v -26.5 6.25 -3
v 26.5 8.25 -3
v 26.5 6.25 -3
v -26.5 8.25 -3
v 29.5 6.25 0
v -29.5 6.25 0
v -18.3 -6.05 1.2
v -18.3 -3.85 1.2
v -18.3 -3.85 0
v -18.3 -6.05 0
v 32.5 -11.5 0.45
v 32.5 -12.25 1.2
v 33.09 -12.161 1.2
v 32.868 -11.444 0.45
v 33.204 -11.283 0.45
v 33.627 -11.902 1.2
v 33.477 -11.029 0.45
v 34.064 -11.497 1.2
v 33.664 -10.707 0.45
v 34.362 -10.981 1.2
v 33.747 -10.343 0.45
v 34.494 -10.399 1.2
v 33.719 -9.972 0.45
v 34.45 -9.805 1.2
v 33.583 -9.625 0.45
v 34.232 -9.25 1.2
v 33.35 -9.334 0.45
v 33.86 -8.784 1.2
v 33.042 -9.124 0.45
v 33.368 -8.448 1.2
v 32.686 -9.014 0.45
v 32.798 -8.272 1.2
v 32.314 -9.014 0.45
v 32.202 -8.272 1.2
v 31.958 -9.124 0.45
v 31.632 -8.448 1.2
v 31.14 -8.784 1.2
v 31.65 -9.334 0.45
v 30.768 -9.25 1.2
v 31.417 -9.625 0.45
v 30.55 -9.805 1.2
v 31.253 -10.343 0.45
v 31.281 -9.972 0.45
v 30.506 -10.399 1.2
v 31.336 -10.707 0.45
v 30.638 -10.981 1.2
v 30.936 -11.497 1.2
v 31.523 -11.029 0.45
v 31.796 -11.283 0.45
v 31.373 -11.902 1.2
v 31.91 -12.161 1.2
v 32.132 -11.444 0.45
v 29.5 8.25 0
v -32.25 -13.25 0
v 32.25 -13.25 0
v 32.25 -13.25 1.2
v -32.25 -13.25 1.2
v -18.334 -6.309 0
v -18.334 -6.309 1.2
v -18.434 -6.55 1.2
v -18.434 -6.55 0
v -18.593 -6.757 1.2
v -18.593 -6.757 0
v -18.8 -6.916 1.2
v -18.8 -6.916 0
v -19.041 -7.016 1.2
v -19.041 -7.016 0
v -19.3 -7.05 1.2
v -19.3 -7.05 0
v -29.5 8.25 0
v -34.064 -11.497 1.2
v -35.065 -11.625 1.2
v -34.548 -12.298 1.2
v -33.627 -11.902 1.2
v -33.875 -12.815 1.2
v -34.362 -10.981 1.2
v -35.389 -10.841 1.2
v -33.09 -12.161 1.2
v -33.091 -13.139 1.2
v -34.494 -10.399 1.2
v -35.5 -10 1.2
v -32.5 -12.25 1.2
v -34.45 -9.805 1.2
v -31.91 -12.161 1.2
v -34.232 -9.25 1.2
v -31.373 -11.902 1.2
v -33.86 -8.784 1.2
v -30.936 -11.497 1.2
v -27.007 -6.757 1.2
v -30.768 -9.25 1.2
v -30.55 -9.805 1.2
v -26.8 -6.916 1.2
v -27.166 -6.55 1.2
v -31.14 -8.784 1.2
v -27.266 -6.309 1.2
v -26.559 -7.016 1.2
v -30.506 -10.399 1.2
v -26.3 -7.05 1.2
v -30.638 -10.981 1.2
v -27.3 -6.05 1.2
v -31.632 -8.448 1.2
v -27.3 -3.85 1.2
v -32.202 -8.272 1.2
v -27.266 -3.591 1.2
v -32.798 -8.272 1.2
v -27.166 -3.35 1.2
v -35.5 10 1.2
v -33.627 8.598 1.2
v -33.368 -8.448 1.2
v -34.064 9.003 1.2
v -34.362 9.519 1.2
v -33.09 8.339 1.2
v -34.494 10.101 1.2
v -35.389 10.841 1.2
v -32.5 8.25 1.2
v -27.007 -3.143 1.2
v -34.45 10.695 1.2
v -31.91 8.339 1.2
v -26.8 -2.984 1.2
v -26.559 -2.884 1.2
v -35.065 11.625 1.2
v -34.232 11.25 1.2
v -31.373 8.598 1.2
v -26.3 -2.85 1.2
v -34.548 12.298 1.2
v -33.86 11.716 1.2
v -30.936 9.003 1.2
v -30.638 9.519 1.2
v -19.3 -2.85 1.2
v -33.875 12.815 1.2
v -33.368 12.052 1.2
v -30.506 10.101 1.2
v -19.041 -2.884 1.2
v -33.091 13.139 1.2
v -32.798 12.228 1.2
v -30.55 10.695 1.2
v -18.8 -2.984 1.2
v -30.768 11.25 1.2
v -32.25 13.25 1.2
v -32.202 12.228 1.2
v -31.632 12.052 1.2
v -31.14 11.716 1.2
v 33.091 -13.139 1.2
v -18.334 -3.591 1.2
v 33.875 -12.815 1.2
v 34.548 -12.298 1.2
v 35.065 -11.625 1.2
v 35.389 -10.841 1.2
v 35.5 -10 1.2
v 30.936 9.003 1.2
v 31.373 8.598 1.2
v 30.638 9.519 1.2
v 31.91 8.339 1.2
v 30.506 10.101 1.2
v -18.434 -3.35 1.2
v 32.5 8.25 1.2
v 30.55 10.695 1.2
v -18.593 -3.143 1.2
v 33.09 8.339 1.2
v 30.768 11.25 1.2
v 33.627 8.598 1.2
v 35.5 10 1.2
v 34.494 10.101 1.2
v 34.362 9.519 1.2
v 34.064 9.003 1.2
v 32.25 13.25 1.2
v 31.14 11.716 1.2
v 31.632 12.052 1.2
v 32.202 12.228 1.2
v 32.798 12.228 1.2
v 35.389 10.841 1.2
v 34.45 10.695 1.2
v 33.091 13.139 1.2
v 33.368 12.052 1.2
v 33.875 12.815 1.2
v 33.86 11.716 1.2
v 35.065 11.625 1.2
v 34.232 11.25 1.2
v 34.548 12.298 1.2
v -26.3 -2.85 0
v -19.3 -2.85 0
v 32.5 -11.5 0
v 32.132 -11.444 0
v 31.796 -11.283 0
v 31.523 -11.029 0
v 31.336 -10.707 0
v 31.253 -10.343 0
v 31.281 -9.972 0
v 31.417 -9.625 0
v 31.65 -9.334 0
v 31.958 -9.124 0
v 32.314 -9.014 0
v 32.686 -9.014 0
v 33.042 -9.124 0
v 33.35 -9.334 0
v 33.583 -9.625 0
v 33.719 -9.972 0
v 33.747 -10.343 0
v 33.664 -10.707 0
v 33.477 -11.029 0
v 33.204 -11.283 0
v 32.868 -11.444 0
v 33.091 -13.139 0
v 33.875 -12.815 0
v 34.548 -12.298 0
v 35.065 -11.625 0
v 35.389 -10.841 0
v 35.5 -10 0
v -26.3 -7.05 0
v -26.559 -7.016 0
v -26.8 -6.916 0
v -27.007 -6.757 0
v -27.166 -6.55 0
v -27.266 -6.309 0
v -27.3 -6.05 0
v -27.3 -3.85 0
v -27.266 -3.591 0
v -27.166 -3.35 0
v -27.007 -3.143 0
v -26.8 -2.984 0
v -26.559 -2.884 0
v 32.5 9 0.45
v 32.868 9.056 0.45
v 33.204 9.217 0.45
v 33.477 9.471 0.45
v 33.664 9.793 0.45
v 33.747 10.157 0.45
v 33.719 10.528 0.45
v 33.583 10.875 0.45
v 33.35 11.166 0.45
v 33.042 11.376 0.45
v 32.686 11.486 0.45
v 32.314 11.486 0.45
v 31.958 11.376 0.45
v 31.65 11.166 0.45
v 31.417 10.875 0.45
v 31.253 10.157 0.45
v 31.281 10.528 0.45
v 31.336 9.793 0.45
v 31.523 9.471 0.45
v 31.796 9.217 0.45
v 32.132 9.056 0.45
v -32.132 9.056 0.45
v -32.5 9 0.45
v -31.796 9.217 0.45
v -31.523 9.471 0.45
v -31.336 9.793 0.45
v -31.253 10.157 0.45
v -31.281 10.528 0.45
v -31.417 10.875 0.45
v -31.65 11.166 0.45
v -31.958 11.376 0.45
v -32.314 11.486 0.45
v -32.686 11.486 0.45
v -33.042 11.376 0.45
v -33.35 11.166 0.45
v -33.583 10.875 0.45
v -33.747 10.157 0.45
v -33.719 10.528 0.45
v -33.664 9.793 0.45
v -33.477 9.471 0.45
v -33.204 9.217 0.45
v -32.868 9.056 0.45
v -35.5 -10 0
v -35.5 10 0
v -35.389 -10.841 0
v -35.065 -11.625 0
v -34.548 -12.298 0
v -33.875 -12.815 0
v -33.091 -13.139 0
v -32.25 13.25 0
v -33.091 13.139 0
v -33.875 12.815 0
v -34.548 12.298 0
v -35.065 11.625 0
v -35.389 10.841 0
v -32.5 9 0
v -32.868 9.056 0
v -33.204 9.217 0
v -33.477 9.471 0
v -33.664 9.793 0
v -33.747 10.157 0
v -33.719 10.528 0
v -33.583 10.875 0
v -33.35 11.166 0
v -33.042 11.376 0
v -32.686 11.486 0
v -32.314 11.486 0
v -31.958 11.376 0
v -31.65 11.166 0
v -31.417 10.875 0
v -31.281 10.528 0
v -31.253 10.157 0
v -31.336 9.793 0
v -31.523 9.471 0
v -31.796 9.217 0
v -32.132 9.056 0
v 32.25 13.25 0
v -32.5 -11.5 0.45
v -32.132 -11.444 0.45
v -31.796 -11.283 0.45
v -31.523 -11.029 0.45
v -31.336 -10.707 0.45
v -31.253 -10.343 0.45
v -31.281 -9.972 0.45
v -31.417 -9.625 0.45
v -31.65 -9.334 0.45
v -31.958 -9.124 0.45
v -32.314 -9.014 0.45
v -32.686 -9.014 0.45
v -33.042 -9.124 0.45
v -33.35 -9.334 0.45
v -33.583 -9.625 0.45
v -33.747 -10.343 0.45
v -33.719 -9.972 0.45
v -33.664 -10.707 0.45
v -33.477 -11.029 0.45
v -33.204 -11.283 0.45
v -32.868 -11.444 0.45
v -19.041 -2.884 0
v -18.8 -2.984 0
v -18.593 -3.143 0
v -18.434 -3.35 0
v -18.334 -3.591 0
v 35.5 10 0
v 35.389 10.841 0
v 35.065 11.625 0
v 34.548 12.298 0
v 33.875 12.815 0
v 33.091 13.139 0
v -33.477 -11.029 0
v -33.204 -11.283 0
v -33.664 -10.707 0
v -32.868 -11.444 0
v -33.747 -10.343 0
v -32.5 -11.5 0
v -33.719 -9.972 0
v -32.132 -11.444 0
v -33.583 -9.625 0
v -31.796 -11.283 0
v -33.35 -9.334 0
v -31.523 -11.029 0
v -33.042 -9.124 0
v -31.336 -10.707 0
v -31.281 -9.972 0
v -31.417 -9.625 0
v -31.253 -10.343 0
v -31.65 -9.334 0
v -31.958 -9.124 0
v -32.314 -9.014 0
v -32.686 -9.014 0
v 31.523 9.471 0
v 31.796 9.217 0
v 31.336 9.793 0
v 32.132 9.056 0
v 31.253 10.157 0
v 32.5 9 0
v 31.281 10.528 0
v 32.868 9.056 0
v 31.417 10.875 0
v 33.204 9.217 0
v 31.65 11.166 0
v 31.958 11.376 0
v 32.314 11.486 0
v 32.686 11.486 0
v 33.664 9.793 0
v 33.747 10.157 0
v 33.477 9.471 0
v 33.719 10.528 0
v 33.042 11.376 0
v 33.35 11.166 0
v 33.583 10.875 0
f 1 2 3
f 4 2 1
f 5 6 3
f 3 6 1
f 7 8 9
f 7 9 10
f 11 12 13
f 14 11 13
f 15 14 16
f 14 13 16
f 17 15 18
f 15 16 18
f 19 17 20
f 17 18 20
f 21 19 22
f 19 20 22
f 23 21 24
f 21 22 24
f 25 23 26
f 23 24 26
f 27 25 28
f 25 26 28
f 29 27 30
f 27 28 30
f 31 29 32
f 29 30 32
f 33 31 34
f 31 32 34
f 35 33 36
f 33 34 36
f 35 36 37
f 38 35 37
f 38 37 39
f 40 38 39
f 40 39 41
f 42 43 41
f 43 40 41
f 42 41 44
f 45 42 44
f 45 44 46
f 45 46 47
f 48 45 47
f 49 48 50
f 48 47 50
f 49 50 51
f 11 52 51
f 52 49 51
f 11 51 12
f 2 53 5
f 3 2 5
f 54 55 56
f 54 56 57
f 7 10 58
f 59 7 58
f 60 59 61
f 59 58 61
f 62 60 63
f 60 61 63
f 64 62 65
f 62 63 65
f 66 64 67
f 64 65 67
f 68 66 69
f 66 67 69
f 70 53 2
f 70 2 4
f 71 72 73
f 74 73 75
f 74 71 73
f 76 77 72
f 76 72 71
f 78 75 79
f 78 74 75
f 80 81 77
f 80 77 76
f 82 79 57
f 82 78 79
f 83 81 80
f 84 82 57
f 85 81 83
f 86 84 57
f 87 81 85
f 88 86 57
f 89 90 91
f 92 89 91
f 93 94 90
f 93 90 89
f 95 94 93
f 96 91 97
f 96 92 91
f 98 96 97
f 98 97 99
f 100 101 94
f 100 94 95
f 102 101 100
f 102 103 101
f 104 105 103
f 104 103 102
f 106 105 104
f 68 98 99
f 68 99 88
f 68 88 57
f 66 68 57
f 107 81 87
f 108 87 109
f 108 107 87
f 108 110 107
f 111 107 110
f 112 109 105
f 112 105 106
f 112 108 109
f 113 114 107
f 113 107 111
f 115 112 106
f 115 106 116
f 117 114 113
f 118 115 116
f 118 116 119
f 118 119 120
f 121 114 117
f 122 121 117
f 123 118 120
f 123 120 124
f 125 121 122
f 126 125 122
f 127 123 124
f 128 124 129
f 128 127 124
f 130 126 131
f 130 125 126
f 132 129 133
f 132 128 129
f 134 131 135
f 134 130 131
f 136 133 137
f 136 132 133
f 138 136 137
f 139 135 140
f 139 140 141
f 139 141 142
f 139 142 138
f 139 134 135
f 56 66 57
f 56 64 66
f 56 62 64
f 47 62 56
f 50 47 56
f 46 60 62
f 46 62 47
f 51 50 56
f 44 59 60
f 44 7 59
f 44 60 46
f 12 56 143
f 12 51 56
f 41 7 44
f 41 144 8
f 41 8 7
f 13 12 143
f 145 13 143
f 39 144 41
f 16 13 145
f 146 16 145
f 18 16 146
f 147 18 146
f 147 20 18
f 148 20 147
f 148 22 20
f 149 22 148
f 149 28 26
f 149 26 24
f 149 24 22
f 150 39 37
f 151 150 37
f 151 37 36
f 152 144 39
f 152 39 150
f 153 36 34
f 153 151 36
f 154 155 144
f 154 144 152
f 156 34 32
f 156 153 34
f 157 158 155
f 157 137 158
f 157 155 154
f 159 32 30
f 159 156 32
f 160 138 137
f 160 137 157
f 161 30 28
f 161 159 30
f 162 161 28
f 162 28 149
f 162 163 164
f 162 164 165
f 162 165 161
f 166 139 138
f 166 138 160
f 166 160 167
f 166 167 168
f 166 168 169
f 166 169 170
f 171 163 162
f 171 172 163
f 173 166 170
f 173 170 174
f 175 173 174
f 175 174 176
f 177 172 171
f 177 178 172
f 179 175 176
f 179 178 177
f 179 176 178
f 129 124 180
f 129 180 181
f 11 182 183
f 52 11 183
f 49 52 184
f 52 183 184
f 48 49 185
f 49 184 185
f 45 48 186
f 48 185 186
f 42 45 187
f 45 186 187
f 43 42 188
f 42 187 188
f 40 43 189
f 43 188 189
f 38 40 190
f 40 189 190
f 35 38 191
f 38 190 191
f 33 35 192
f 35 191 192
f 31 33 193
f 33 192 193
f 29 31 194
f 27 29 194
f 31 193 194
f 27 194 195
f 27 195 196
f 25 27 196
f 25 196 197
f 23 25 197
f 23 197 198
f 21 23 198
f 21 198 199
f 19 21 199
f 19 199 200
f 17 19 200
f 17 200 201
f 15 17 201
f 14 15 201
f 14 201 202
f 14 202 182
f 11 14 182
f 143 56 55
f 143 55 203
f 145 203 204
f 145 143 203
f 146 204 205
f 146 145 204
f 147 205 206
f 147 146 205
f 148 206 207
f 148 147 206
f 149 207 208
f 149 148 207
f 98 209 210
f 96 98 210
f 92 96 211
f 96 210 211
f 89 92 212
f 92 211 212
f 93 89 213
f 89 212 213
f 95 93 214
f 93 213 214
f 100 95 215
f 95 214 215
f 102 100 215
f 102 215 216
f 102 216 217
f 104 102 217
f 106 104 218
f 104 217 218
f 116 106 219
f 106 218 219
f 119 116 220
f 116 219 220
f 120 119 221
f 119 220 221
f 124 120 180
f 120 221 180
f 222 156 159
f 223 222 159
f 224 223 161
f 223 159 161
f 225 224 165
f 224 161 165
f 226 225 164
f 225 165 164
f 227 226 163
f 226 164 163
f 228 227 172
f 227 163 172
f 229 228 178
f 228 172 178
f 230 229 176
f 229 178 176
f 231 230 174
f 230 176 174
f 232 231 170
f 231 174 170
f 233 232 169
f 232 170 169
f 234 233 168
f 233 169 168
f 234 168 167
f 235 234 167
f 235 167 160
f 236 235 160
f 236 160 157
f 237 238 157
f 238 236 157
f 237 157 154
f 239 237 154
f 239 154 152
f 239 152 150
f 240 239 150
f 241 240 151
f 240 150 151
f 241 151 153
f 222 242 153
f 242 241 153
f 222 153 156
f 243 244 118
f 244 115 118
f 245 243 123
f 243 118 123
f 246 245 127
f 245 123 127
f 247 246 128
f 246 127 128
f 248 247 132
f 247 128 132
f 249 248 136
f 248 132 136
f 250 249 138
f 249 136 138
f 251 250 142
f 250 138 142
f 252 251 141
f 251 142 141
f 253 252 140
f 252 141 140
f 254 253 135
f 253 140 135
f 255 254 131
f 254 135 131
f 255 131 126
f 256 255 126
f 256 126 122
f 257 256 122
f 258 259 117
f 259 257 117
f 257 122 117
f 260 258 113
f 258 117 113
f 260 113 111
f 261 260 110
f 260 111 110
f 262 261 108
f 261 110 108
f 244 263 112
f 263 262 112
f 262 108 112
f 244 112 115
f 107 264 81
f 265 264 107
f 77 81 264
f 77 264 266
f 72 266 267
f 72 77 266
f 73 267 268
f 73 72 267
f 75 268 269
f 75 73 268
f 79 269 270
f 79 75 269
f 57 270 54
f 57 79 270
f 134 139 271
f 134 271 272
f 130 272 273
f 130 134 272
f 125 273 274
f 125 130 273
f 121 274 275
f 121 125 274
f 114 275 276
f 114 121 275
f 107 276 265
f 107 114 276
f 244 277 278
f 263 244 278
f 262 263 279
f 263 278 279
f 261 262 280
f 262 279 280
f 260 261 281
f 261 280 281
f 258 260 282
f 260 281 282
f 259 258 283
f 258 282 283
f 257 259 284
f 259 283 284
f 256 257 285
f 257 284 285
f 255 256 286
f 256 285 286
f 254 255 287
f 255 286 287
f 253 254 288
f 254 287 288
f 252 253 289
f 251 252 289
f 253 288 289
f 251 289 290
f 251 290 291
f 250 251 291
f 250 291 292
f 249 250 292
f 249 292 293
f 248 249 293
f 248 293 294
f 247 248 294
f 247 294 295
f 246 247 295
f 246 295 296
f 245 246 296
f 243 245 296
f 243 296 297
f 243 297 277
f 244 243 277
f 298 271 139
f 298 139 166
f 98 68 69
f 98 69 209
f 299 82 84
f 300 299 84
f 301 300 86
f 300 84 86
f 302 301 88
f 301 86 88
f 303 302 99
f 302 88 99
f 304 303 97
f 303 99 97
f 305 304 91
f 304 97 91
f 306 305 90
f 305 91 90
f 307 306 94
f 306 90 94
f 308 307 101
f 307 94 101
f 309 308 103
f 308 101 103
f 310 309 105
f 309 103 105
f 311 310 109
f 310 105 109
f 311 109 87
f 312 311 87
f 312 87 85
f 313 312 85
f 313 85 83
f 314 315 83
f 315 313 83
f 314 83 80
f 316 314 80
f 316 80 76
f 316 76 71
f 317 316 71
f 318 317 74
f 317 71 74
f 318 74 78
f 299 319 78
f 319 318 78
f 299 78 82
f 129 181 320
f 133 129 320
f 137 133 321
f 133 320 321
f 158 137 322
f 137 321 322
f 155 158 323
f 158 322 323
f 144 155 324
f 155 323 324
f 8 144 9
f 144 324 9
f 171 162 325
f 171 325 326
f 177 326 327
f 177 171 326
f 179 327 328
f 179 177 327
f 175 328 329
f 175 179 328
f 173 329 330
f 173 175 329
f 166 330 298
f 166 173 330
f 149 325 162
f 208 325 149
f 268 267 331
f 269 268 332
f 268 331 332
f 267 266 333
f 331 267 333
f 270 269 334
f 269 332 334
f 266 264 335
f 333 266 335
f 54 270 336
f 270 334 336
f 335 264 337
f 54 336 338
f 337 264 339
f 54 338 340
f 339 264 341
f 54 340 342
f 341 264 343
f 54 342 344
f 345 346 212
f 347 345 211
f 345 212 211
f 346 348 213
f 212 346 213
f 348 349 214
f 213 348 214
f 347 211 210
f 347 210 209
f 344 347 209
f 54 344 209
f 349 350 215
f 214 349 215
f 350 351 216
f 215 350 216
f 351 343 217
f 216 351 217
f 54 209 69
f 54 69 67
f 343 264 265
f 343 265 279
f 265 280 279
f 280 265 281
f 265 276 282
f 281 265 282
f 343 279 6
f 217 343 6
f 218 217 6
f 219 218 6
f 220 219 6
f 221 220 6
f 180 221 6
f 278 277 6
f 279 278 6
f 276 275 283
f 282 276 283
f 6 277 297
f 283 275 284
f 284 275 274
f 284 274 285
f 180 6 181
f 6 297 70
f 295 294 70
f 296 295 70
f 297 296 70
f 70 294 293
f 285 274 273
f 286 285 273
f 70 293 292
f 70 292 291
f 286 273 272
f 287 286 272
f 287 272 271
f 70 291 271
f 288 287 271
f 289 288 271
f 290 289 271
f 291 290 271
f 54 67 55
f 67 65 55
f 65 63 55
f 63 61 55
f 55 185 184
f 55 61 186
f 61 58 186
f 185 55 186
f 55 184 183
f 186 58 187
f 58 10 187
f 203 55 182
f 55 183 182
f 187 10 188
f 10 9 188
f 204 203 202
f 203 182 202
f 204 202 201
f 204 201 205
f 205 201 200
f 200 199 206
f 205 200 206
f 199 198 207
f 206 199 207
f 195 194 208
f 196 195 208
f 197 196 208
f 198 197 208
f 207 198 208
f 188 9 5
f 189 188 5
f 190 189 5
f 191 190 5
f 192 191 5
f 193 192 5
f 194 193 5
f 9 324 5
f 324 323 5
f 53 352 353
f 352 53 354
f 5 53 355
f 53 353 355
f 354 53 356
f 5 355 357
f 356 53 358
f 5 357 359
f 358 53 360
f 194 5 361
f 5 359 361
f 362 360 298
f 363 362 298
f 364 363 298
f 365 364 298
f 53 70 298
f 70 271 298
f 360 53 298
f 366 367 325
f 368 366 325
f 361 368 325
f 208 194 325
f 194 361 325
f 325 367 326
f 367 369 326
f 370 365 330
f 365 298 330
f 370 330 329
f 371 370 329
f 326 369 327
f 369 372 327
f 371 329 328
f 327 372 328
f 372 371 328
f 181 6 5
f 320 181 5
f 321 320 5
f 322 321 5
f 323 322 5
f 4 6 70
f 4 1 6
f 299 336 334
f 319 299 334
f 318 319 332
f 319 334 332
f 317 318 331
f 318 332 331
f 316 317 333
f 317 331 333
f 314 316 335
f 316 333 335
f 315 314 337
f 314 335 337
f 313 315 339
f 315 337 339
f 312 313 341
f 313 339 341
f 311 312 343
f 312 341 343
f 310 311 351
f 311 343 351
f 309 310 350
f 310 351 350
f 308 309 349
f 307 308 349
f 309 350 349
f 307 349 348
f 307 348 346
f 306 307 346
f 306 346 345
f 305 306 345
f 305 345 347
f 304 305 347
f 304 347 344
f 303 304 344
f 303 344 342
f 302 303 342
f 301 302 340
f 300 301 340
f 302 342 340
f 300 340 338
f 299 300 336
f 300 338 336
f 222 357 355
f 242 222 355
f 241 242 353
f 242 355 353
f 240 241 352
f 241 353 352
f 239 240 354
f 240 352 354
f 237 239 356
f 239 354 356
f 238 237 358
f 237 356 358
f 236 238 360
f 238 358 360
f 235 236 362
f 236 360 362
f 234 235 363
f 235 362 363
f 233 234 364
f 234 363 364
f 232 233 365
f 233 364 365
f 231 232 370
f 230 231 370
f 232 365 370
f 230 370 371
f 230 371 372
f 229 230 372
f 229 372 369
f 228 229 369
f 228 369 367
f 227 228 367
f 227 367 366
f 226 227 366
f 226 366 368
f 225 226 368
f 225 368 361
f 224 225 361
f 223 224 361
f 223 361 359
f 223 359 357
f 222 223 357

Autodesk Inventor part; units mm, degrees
ref_plane "YZ Plane" through (0, 0, 0) normal (1, 0, 0) x (0, 1, 0)
ref_plane "XZ Plane" through (0, 0, 0) normal (0, 1, 0) x (-1, 0, 0)
ref_plane "XY Plane" through (0, 0, 0) normal (0, 0, 1) x (1, 0, 0)
sketch "Sketch1" plane through (0, 0, 0) normal (0, 0, 1) x (1, 0, 0)
  line L0 (-35.5, 13.25) -> (35.5, 13.25)
  line L1 (35.5, 13.25) -> (35.5, -13.25)
  line L2 (35.5, -13.25) -> (-35.5, -13.25)
  line L3 (-35.5, -13.25) -> (-35.5, 13.25)
  point P0 (0, 0)
  dimension "d0" = 26.5
  dimension "d1" = 71
  dimension "d2" = 35.5
  dimension "d3" = 13.25
extrude "Extrusion1" add sketch "Sketch1" along normal blind 1.2
fillet "Fillet1" radius 3.25 4 edges at (-35.5, 13.25, 0.6) (-35.5, -13.25, 0.6) (35.5, -13.25, 0.6) (35.5, 13.25, 0.6)
sketch "Sketch2" plane through (0, 0, 1.2) normal (0, 0, 1) x (1, 0, 0)
  line L0 (32.25, 13.25) -> (-32.25, 13.25) projected
  line L1 (-35.5, 10) -> (-35.5, -10) projected
  line L2 (-32.25, -13.25) -> (32.25, -13.25) projected
  line L3 (35.5, -10) -> (35.5, 10) projected
  point P0 (0, 0)
  point P1 (-32.5, 10.25)
  point P2 (32.5, 10.25)
  point P3 (32.5, -10.25)
  point P4 (-32.5, -10.25)
  dimension "d7" = 3
  dimension "d8" = 3
  dimension "d9" = 3
  dimension "d10" = 3
  dimension "d11" = 3
  dimension "d12" = 3
  dimension "d13" = 3
  dimension "d14" = 3
hole "Hole1" at (-32.5, 10.25, 1.2) at (32.5, 10.25, 1.2) at (32.5, -10.25, 1.2) at (-32.5, -10.25, 1.2) direction (0, 0, -1) diameter 2.5 depth 4 tip angle 118 countersink diameter 4 countersink angle 90
sketch "Sketch3" plane through (0, 0, 1.2) normal (0, 0, 1) x (1, 0, 0)
  line L0 (-27.3, -2.85) -> (-18.3, -2.85)
  line L1 (-18.3, -2.85) -> (-18.3, -7.05)
  line L2 (-18.3, -7.05) -> (-27.3, -7.05)
  line L3 (-27.3, -7.05) -> (-27.3, -2.85)
  line L4 (-35.5, 10) -> (-35.5, -10) projected
  line L5 (-32.25, -13.25) -> (32.25, -13.25) projected
  point P0 (0, 0)
  dimension "d22" = 8.2
  dimension "d23" = 17.2
  dimension "d24" = 6.2
  dimension "d25" = 10.4
  dimension "d29" = 9
  dimension "d30" = 4.2
extrude "Extrusion2" cut sketch "Sketch3" against normal blind 1.2
fillet "Fillet2" radius 1 4 edges at (-27.3, -2.85, 0.6) (-27.3, -7.05, 0.6) (-18.3, -2.85, 0.6) (-18.3, -7.05, 0.6)
sketch "Sketch4" plane through (0, 0, 0) normal (0, 0, -1) x (-1, 0, 0)
  line L0 (-29.5, 8.25) -> (29.5, 8.25)
  line L1 (29.5, 8.25) -> (29.5, 6.25)
  line L2 (29.5, 6.25) -> (-29.5, 6.25)
  line L3 (-29.5, 6.25) -> (-29.5, 8.25)
  line L4 (-35.5, -10) -> (-35.5, 10) projected
  line L5 (35.5, 10) -> (35.5, -10) projected
  line L6 (-32.25, 13.25) -> (32.25, 13.25) projected
  point P0 (0, 0)
  dimension "d31" = 6
  dimension "d32" = 6
  dimension "d33" = 2
  dimension "d34" = 5
extrude "Extrusion3" add sketch "Sketch4" along normal blind 3
chamfer "Chamfer1" distance 3 angle 45 2 edges at (29.5, 7.25, -3) (-29.5, 7.25, -3)
properties part number "cover"
